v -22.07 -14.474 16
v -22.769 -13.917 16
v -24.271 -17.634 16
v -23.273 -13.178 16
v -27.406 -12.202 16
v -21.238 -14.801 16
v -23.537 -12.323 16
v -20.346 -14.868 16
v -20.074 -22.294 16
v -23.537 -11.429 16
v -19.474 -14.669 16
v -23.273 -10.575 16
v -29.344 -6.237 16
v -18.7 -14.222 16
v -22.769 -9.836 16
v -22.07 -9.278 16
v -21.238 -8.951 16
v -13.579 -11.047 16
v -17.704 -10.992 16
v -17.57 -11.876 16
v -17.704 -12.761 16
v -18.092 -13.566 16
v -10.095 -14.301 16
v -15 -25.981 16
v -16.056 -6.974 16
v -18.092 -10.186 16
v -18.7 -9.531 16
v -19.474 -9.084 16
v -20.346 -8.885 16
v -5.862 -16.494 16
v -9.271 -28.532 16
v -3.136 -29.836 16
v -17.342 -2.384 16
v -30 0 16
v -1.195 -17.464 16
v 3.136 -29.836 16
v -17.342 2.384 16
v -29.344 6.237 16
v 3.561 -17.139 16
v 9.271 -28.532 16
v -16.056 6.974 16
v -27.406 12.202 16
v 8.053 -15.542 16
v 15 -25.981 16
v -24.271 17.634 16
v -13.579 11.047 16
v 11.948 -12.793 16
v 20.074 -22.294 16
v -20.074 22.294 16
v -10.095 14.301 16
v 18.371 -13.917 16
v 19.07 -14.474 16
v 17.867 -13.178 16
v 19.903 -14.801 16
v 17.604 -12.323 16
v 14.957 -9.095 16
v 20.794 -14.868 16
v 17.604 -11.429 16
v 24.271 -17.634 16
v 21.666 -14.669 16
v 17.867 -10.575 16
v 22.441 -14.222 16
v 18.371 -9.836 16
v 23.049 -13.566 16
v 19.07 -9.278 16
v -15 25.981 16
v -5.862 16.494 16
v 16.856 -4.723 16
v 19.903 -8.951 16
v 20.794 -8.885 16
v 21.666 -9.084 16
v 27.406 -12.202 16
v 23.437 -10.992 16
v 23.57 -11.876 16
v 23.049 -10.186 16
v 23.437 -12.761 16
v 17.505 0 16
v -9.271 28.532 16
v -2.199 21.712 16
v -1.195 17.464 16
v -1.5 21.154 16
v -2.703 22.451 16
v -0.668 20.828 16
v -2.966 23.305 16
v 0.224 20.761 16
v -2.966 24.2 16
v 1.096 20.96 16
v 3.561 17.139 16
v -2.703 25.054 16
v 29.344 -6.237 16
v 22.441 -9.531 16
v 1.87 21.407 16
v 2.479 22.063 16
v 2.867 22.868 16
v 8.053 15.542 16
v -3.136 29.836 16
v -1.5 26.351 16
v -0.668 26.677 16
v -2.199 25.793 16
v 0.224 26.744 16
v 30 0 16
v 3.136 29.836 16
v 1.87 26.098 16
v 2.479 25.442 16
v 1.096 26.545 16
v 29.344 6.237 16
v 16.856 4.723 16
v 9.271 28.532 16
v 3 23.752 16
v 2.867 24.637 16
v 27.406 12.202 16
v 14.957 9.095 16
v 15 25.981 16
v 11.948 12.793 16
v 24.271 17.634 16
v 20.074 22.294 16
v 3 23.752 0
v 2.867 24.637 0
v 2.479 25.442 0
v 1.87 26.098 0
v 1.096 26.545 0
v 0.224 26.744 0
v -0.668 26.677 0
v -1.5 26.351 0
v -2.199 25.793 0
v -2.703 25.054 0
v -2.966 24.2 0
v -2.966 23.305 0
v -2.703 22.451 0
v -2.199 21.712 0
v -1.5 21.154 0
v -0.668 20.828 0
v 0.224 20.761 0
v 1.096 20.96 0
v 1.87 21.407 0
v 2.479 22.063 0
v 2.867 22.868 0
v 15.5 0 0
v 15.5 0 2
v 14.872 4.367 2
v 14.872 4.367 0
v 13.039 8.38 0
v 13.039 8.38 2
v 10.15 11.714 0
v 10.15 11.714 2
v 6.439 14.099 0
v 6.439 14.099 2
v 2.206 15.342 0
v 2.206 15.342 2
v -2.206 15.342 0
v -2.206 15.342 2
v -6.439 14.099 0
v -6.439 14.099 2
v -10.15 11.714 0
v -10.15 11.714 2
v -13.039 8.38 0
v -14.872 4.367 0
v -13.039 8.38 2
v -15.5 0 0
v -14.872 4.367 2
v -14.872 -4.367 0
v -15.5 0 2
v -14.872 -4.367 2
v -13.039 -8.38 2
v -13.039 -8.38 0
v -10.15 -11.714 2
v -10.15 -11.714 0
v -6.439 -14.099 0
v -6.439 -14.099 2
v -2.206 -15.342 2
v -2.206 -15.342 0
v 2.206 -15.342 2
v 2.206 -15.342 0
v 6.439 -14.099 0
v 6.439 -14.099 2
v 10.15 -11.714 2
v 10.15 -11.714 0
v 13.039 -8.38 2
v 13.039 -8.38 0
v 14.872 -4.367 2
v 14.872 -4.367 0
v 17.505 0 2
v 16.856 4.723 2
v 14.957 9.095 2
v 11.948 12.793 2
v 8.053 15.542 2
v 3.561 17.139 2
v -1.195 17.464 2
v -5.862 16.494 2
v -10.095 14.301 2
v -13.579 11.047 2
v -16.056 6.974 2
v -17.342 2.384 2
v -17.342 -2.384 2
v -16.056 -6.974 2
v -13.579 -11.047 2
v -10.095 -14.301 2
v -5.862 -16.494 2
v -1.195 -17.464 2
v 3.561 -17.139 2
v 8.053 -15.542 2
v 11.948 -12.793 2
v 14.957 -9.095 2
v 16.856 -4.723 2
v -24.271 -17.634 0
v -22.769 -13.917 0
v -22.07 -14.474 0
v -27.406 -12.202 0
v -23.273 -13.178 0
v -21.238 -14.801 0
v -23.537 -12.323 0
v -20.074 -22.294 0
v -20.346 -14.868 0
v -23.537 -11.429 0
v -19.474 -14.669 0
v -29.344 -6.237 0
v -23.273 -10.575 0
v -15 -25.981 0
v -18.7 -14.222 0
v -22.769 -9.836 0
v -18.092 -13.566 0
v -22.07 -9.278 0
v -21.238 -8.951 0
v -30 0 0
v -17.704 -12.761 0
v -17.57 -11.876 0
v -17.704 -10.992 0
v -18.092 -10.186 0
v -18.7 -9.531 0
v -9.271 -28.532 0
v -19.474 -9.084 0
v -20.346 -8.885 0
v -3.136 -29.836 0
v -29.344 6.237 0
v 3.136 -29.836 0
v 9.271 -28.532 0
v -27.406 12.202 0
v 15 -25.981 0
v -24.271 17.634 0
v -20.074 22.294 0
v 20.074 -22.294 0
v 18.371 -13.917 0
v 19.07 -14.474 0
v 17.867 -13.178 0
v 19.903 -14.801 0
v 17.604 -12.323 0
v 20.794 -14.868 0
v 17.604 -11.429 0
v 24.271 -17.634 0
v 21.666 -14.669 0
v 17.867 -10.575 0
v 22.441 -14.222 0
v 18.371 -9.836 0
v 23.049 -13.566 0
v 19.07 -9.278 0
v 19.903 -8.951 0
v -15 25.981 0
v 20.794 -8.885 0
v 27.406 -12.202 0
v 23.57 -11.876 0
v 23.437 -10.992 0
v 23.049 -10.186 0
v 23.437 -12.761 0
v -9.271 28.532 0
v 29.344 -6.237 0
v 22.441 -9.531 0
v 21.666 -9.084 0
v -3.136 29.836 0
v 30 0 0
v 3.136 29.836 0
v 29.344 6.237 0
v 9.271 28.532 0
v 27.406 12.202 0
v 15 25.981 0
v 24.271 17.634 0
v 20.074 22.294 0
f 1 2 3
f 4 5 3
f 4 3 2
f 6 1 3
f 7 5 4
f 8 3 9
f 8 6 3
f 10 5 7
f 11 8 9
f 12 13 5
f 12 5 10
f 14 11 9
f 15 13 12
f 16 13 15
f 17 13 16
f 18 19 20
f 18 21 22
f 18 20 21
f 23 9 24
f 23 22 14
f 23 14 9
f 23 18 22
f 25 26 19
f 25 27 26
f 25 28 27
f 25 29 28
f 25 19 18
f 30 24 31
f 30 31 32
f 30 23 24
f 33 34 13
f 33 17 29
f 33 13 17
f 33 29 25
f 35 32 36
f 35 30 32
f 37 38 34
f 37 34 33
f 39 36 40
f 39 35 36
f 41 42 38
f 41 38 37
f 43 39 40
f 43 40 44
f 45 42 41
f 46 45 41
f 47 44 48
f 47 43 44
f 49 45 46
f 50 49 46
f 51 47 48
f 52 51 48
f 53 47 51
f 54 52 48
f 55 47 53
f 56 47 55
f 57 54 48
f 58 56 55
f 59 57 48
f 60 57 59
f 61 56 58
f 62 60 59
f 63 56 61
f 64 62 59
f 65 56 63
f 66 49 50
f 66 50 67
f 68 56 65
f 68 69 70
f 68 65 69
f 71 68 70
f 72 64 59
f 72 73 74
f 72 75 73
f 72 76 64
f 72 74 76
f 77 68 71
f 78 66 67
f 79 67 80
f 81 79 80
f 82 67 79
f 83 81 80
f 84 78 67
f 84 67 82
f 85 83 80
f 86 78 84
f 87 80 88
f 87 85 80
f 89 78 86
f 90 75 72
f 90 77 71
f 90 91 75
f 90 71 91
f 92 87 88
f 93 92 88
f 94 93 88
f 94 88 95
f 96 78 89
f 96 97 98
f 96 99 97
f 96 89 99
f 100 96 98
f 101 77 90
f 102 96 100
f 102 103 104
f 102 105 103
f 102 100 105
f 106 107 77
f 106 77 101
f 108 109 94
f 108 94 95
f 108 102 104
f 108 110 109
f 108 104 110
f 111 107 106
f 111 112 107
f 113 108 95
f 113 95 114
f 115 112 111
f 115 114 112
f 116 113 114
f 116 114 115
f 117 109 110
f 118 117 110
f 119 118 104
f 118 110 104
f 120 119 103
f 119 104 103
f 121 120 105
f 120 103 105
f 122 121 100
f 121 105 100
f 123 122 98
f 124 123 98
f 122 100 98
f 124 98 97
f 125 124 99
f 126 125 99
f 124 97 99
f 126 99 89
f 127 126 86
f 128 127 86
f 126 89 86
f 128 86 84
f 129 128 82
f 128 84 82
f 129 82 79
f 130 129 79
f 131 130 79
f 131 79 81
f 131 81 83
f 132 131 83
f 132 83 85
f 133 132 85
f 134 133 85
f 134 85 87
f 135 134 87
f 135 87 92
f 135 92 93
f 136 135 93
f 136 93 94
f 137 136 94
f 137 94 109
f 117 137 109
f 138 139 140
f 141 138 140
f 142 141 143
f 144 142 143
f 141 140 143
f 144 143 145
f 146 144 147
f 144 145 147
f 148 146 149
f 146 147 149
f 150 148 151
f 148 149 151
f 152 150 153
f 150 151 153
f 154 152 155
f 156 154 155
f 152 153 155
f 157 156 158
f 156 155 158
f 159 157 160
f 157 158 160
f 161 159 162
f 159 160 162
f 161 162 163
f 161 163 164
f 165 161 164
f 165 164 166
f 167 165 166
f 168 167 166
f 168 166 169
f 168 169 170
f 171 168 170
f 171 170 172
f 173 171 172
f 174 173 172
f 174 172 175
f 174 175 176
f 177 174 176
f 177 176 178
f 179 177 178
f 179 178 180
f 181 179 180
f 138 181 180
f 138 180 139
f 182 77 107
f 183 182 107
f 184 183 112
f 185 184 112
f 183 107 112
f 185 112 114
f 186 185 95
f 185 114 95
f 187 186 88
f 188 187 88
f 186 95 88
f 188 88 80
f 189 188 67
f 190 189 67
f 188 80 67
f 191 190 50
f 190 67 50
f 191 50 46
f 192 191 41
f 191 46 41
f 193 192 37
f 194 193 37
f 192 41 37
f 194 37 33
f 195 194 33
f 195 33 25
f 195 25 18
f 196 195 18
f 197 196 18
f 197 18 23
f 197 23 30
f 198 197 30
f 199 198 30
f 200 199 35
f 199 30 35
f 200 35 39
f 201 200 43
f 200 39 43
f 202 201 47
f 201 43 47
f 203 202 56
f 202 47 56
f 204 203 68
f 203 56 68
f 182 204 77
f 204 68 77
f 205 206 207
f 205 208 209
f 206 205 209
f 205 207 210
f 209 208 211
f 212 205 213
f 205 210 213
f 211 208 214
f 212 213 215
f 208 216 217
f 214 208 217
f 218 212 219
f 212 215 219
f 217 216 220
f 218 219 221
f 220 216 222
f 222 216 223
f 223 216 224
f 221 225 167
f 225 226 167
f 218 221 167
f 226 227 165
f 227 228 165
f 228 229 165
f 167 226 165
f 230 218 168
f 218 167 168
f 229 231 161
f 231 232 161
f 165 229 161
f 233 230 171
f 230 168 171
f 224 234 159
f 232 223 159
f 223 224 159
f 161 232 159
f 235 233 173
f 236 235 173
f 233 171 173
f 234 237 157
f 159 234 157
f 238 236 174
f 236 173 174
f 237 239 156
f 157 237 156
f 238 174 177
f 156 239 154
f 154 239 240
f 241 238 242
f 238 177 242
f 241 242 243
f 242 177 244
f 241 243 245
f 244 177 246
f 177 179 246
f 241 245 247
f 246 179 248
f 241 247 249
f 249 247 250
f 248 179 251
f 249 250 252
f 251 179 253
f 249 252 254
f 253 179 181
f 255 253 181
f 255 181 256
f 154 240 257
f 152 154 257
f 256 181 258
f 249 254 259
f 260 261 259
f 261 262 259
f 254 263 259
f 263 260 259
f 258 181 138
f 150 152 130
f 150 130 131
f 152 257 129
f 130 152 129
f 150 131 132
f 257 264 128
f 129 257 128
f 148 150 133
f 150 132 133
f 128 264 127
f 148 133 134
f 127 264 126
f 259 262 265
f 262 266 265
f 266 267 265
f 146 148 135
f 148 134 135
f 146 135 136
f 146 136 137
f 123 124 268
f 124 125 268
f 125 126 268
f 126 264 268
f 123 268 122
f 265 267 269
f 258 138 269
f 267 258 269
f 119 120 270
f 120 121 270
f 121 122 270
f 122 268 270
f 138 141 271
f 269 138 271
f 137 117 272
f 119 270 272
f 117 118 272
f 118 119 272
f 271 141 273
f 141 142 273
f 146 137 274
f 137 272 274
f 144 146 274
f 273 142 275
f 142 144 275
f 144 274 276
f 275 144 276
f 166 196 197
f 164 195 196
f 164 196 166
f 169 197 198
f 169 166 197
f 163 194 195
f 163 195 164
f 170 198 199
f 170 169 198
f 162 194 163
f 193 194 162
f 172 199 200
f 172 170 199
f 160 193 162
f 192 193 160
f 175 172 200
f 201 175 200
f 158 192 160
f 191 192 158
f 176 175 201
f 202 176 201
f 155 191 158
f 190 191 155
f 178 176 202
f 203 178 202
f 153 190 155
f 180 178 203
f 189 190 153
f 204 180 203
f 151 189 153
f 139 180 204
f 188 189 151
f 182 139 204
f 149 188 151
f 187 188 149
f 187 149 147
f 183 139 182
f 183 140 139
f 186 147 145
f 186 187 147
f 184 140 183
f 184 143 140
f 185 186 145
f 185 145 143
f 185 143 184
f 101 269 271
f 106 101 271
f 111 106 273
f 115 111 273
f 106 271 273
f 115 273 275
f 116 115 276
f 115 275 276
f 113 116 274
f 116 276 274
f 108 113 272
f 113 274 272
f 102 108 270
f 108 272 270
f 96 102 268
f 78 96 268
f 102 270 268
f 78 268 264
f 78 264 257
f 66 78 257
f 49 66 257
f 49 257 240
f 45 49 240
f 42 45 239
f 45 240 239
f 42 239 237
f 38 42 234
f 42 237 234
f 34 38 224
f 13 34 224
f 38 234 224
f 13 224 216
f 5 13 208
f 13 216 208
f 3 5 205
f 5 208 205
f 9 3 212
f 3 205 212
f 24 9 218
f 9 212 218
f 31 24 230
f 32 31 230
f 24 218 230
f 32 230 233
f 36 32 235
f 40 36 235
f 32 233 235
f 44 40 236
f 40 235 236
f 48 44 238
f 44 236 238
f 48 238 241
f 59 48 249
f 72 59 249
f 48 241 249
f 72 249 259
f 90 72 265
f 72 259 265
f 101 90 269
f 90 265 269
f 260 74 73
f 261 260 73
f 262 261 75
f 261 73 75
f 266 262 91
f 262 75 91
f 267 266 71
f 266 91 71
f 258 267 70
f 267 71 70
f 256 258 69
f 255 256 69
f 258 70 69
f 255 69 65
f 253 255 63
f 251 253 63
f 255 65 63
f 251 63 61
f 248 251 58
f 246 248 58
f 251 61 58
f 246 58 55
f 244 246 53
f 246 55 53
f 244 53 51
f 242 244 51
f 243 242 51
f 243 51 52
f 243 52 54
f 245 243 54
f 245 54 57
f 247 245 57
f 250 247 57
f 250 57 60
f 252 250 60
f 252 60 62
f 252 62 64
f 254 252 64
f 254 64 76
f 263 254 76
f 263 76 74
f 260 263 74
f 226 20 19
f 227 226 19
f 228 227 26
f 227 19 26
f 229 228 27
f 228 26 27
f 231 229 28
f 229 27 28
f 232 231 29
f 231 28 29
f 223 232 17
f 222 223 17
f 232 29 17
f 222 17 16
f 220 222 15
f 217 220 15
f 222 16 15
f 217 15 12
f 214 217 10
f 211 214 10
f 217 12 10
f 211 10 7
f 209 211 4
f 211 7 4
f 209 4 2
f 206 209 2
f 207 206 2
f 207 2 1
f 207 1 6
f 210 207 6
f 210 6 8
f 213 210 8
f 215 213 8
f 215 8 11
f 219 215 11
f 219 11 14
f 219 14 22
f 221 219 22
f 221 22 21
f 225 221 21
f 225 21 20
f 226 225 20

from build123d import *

# Parameters (mm, degrees)
SKETCH1_R           = 30
BOSS_EXTRUDE1_DEPTH = 16
SKETCH2_R           = 17.505
CUT_EXTRUDE1_DEPTH  = 14
SKETCH4_R           = 15.5
CUT_EXTRUDE2_DEPTH  = 45.676615807
SKETCH5_R           = 3
CUT_EXTRUDE3_DEPTH  = 46.343136195


with BuildPart() as part:
    # Sketch1 → Boss-Extrude1 (new body)
    with BuildSketch(Plane.XY):
        Circle(SKETCH1_R)
    extrude(amount=BOSS_EXTRUDE1_DEPTH)

    # Sketch2 → Cut-Extrude1 (cut)
    with BuildSketch(Plane.XY.offset(16)):
        Circle(SKETCH2_R)
    extrude(amount=-CUT_EXTRUDE1_DEPTH, mode=Mode.SUBTRACT)

    # Sketch4 → Cut-Extrude2 (cut, through all)
    with BuildSketch(Plane.XY.offset(2)):
        Circle(SKETCH4_R)
    extrude(amount=-CUT_EXTRUDE2_DEPTH, mode=Mode.SUBTRACT)

    # Sketch5 → Cut-Extrude3 (cut, through all)
    with BuildSketch(Plane.XY.offset(16)):
        with Locations((0, 23.7525)):
            Circle(SKETCH5_R)
        with Locations((20.570268403, -11.87625)):
            Circle(SKETCH5_R)
        with Locations((-20.570268403, -11.87625)):
            Circle(SKETCH5_R)
    extrude(amount=-CUT_EXTRUDE3_DEPTH, mode=Mode.SUBTRACT)


solid = part.part
